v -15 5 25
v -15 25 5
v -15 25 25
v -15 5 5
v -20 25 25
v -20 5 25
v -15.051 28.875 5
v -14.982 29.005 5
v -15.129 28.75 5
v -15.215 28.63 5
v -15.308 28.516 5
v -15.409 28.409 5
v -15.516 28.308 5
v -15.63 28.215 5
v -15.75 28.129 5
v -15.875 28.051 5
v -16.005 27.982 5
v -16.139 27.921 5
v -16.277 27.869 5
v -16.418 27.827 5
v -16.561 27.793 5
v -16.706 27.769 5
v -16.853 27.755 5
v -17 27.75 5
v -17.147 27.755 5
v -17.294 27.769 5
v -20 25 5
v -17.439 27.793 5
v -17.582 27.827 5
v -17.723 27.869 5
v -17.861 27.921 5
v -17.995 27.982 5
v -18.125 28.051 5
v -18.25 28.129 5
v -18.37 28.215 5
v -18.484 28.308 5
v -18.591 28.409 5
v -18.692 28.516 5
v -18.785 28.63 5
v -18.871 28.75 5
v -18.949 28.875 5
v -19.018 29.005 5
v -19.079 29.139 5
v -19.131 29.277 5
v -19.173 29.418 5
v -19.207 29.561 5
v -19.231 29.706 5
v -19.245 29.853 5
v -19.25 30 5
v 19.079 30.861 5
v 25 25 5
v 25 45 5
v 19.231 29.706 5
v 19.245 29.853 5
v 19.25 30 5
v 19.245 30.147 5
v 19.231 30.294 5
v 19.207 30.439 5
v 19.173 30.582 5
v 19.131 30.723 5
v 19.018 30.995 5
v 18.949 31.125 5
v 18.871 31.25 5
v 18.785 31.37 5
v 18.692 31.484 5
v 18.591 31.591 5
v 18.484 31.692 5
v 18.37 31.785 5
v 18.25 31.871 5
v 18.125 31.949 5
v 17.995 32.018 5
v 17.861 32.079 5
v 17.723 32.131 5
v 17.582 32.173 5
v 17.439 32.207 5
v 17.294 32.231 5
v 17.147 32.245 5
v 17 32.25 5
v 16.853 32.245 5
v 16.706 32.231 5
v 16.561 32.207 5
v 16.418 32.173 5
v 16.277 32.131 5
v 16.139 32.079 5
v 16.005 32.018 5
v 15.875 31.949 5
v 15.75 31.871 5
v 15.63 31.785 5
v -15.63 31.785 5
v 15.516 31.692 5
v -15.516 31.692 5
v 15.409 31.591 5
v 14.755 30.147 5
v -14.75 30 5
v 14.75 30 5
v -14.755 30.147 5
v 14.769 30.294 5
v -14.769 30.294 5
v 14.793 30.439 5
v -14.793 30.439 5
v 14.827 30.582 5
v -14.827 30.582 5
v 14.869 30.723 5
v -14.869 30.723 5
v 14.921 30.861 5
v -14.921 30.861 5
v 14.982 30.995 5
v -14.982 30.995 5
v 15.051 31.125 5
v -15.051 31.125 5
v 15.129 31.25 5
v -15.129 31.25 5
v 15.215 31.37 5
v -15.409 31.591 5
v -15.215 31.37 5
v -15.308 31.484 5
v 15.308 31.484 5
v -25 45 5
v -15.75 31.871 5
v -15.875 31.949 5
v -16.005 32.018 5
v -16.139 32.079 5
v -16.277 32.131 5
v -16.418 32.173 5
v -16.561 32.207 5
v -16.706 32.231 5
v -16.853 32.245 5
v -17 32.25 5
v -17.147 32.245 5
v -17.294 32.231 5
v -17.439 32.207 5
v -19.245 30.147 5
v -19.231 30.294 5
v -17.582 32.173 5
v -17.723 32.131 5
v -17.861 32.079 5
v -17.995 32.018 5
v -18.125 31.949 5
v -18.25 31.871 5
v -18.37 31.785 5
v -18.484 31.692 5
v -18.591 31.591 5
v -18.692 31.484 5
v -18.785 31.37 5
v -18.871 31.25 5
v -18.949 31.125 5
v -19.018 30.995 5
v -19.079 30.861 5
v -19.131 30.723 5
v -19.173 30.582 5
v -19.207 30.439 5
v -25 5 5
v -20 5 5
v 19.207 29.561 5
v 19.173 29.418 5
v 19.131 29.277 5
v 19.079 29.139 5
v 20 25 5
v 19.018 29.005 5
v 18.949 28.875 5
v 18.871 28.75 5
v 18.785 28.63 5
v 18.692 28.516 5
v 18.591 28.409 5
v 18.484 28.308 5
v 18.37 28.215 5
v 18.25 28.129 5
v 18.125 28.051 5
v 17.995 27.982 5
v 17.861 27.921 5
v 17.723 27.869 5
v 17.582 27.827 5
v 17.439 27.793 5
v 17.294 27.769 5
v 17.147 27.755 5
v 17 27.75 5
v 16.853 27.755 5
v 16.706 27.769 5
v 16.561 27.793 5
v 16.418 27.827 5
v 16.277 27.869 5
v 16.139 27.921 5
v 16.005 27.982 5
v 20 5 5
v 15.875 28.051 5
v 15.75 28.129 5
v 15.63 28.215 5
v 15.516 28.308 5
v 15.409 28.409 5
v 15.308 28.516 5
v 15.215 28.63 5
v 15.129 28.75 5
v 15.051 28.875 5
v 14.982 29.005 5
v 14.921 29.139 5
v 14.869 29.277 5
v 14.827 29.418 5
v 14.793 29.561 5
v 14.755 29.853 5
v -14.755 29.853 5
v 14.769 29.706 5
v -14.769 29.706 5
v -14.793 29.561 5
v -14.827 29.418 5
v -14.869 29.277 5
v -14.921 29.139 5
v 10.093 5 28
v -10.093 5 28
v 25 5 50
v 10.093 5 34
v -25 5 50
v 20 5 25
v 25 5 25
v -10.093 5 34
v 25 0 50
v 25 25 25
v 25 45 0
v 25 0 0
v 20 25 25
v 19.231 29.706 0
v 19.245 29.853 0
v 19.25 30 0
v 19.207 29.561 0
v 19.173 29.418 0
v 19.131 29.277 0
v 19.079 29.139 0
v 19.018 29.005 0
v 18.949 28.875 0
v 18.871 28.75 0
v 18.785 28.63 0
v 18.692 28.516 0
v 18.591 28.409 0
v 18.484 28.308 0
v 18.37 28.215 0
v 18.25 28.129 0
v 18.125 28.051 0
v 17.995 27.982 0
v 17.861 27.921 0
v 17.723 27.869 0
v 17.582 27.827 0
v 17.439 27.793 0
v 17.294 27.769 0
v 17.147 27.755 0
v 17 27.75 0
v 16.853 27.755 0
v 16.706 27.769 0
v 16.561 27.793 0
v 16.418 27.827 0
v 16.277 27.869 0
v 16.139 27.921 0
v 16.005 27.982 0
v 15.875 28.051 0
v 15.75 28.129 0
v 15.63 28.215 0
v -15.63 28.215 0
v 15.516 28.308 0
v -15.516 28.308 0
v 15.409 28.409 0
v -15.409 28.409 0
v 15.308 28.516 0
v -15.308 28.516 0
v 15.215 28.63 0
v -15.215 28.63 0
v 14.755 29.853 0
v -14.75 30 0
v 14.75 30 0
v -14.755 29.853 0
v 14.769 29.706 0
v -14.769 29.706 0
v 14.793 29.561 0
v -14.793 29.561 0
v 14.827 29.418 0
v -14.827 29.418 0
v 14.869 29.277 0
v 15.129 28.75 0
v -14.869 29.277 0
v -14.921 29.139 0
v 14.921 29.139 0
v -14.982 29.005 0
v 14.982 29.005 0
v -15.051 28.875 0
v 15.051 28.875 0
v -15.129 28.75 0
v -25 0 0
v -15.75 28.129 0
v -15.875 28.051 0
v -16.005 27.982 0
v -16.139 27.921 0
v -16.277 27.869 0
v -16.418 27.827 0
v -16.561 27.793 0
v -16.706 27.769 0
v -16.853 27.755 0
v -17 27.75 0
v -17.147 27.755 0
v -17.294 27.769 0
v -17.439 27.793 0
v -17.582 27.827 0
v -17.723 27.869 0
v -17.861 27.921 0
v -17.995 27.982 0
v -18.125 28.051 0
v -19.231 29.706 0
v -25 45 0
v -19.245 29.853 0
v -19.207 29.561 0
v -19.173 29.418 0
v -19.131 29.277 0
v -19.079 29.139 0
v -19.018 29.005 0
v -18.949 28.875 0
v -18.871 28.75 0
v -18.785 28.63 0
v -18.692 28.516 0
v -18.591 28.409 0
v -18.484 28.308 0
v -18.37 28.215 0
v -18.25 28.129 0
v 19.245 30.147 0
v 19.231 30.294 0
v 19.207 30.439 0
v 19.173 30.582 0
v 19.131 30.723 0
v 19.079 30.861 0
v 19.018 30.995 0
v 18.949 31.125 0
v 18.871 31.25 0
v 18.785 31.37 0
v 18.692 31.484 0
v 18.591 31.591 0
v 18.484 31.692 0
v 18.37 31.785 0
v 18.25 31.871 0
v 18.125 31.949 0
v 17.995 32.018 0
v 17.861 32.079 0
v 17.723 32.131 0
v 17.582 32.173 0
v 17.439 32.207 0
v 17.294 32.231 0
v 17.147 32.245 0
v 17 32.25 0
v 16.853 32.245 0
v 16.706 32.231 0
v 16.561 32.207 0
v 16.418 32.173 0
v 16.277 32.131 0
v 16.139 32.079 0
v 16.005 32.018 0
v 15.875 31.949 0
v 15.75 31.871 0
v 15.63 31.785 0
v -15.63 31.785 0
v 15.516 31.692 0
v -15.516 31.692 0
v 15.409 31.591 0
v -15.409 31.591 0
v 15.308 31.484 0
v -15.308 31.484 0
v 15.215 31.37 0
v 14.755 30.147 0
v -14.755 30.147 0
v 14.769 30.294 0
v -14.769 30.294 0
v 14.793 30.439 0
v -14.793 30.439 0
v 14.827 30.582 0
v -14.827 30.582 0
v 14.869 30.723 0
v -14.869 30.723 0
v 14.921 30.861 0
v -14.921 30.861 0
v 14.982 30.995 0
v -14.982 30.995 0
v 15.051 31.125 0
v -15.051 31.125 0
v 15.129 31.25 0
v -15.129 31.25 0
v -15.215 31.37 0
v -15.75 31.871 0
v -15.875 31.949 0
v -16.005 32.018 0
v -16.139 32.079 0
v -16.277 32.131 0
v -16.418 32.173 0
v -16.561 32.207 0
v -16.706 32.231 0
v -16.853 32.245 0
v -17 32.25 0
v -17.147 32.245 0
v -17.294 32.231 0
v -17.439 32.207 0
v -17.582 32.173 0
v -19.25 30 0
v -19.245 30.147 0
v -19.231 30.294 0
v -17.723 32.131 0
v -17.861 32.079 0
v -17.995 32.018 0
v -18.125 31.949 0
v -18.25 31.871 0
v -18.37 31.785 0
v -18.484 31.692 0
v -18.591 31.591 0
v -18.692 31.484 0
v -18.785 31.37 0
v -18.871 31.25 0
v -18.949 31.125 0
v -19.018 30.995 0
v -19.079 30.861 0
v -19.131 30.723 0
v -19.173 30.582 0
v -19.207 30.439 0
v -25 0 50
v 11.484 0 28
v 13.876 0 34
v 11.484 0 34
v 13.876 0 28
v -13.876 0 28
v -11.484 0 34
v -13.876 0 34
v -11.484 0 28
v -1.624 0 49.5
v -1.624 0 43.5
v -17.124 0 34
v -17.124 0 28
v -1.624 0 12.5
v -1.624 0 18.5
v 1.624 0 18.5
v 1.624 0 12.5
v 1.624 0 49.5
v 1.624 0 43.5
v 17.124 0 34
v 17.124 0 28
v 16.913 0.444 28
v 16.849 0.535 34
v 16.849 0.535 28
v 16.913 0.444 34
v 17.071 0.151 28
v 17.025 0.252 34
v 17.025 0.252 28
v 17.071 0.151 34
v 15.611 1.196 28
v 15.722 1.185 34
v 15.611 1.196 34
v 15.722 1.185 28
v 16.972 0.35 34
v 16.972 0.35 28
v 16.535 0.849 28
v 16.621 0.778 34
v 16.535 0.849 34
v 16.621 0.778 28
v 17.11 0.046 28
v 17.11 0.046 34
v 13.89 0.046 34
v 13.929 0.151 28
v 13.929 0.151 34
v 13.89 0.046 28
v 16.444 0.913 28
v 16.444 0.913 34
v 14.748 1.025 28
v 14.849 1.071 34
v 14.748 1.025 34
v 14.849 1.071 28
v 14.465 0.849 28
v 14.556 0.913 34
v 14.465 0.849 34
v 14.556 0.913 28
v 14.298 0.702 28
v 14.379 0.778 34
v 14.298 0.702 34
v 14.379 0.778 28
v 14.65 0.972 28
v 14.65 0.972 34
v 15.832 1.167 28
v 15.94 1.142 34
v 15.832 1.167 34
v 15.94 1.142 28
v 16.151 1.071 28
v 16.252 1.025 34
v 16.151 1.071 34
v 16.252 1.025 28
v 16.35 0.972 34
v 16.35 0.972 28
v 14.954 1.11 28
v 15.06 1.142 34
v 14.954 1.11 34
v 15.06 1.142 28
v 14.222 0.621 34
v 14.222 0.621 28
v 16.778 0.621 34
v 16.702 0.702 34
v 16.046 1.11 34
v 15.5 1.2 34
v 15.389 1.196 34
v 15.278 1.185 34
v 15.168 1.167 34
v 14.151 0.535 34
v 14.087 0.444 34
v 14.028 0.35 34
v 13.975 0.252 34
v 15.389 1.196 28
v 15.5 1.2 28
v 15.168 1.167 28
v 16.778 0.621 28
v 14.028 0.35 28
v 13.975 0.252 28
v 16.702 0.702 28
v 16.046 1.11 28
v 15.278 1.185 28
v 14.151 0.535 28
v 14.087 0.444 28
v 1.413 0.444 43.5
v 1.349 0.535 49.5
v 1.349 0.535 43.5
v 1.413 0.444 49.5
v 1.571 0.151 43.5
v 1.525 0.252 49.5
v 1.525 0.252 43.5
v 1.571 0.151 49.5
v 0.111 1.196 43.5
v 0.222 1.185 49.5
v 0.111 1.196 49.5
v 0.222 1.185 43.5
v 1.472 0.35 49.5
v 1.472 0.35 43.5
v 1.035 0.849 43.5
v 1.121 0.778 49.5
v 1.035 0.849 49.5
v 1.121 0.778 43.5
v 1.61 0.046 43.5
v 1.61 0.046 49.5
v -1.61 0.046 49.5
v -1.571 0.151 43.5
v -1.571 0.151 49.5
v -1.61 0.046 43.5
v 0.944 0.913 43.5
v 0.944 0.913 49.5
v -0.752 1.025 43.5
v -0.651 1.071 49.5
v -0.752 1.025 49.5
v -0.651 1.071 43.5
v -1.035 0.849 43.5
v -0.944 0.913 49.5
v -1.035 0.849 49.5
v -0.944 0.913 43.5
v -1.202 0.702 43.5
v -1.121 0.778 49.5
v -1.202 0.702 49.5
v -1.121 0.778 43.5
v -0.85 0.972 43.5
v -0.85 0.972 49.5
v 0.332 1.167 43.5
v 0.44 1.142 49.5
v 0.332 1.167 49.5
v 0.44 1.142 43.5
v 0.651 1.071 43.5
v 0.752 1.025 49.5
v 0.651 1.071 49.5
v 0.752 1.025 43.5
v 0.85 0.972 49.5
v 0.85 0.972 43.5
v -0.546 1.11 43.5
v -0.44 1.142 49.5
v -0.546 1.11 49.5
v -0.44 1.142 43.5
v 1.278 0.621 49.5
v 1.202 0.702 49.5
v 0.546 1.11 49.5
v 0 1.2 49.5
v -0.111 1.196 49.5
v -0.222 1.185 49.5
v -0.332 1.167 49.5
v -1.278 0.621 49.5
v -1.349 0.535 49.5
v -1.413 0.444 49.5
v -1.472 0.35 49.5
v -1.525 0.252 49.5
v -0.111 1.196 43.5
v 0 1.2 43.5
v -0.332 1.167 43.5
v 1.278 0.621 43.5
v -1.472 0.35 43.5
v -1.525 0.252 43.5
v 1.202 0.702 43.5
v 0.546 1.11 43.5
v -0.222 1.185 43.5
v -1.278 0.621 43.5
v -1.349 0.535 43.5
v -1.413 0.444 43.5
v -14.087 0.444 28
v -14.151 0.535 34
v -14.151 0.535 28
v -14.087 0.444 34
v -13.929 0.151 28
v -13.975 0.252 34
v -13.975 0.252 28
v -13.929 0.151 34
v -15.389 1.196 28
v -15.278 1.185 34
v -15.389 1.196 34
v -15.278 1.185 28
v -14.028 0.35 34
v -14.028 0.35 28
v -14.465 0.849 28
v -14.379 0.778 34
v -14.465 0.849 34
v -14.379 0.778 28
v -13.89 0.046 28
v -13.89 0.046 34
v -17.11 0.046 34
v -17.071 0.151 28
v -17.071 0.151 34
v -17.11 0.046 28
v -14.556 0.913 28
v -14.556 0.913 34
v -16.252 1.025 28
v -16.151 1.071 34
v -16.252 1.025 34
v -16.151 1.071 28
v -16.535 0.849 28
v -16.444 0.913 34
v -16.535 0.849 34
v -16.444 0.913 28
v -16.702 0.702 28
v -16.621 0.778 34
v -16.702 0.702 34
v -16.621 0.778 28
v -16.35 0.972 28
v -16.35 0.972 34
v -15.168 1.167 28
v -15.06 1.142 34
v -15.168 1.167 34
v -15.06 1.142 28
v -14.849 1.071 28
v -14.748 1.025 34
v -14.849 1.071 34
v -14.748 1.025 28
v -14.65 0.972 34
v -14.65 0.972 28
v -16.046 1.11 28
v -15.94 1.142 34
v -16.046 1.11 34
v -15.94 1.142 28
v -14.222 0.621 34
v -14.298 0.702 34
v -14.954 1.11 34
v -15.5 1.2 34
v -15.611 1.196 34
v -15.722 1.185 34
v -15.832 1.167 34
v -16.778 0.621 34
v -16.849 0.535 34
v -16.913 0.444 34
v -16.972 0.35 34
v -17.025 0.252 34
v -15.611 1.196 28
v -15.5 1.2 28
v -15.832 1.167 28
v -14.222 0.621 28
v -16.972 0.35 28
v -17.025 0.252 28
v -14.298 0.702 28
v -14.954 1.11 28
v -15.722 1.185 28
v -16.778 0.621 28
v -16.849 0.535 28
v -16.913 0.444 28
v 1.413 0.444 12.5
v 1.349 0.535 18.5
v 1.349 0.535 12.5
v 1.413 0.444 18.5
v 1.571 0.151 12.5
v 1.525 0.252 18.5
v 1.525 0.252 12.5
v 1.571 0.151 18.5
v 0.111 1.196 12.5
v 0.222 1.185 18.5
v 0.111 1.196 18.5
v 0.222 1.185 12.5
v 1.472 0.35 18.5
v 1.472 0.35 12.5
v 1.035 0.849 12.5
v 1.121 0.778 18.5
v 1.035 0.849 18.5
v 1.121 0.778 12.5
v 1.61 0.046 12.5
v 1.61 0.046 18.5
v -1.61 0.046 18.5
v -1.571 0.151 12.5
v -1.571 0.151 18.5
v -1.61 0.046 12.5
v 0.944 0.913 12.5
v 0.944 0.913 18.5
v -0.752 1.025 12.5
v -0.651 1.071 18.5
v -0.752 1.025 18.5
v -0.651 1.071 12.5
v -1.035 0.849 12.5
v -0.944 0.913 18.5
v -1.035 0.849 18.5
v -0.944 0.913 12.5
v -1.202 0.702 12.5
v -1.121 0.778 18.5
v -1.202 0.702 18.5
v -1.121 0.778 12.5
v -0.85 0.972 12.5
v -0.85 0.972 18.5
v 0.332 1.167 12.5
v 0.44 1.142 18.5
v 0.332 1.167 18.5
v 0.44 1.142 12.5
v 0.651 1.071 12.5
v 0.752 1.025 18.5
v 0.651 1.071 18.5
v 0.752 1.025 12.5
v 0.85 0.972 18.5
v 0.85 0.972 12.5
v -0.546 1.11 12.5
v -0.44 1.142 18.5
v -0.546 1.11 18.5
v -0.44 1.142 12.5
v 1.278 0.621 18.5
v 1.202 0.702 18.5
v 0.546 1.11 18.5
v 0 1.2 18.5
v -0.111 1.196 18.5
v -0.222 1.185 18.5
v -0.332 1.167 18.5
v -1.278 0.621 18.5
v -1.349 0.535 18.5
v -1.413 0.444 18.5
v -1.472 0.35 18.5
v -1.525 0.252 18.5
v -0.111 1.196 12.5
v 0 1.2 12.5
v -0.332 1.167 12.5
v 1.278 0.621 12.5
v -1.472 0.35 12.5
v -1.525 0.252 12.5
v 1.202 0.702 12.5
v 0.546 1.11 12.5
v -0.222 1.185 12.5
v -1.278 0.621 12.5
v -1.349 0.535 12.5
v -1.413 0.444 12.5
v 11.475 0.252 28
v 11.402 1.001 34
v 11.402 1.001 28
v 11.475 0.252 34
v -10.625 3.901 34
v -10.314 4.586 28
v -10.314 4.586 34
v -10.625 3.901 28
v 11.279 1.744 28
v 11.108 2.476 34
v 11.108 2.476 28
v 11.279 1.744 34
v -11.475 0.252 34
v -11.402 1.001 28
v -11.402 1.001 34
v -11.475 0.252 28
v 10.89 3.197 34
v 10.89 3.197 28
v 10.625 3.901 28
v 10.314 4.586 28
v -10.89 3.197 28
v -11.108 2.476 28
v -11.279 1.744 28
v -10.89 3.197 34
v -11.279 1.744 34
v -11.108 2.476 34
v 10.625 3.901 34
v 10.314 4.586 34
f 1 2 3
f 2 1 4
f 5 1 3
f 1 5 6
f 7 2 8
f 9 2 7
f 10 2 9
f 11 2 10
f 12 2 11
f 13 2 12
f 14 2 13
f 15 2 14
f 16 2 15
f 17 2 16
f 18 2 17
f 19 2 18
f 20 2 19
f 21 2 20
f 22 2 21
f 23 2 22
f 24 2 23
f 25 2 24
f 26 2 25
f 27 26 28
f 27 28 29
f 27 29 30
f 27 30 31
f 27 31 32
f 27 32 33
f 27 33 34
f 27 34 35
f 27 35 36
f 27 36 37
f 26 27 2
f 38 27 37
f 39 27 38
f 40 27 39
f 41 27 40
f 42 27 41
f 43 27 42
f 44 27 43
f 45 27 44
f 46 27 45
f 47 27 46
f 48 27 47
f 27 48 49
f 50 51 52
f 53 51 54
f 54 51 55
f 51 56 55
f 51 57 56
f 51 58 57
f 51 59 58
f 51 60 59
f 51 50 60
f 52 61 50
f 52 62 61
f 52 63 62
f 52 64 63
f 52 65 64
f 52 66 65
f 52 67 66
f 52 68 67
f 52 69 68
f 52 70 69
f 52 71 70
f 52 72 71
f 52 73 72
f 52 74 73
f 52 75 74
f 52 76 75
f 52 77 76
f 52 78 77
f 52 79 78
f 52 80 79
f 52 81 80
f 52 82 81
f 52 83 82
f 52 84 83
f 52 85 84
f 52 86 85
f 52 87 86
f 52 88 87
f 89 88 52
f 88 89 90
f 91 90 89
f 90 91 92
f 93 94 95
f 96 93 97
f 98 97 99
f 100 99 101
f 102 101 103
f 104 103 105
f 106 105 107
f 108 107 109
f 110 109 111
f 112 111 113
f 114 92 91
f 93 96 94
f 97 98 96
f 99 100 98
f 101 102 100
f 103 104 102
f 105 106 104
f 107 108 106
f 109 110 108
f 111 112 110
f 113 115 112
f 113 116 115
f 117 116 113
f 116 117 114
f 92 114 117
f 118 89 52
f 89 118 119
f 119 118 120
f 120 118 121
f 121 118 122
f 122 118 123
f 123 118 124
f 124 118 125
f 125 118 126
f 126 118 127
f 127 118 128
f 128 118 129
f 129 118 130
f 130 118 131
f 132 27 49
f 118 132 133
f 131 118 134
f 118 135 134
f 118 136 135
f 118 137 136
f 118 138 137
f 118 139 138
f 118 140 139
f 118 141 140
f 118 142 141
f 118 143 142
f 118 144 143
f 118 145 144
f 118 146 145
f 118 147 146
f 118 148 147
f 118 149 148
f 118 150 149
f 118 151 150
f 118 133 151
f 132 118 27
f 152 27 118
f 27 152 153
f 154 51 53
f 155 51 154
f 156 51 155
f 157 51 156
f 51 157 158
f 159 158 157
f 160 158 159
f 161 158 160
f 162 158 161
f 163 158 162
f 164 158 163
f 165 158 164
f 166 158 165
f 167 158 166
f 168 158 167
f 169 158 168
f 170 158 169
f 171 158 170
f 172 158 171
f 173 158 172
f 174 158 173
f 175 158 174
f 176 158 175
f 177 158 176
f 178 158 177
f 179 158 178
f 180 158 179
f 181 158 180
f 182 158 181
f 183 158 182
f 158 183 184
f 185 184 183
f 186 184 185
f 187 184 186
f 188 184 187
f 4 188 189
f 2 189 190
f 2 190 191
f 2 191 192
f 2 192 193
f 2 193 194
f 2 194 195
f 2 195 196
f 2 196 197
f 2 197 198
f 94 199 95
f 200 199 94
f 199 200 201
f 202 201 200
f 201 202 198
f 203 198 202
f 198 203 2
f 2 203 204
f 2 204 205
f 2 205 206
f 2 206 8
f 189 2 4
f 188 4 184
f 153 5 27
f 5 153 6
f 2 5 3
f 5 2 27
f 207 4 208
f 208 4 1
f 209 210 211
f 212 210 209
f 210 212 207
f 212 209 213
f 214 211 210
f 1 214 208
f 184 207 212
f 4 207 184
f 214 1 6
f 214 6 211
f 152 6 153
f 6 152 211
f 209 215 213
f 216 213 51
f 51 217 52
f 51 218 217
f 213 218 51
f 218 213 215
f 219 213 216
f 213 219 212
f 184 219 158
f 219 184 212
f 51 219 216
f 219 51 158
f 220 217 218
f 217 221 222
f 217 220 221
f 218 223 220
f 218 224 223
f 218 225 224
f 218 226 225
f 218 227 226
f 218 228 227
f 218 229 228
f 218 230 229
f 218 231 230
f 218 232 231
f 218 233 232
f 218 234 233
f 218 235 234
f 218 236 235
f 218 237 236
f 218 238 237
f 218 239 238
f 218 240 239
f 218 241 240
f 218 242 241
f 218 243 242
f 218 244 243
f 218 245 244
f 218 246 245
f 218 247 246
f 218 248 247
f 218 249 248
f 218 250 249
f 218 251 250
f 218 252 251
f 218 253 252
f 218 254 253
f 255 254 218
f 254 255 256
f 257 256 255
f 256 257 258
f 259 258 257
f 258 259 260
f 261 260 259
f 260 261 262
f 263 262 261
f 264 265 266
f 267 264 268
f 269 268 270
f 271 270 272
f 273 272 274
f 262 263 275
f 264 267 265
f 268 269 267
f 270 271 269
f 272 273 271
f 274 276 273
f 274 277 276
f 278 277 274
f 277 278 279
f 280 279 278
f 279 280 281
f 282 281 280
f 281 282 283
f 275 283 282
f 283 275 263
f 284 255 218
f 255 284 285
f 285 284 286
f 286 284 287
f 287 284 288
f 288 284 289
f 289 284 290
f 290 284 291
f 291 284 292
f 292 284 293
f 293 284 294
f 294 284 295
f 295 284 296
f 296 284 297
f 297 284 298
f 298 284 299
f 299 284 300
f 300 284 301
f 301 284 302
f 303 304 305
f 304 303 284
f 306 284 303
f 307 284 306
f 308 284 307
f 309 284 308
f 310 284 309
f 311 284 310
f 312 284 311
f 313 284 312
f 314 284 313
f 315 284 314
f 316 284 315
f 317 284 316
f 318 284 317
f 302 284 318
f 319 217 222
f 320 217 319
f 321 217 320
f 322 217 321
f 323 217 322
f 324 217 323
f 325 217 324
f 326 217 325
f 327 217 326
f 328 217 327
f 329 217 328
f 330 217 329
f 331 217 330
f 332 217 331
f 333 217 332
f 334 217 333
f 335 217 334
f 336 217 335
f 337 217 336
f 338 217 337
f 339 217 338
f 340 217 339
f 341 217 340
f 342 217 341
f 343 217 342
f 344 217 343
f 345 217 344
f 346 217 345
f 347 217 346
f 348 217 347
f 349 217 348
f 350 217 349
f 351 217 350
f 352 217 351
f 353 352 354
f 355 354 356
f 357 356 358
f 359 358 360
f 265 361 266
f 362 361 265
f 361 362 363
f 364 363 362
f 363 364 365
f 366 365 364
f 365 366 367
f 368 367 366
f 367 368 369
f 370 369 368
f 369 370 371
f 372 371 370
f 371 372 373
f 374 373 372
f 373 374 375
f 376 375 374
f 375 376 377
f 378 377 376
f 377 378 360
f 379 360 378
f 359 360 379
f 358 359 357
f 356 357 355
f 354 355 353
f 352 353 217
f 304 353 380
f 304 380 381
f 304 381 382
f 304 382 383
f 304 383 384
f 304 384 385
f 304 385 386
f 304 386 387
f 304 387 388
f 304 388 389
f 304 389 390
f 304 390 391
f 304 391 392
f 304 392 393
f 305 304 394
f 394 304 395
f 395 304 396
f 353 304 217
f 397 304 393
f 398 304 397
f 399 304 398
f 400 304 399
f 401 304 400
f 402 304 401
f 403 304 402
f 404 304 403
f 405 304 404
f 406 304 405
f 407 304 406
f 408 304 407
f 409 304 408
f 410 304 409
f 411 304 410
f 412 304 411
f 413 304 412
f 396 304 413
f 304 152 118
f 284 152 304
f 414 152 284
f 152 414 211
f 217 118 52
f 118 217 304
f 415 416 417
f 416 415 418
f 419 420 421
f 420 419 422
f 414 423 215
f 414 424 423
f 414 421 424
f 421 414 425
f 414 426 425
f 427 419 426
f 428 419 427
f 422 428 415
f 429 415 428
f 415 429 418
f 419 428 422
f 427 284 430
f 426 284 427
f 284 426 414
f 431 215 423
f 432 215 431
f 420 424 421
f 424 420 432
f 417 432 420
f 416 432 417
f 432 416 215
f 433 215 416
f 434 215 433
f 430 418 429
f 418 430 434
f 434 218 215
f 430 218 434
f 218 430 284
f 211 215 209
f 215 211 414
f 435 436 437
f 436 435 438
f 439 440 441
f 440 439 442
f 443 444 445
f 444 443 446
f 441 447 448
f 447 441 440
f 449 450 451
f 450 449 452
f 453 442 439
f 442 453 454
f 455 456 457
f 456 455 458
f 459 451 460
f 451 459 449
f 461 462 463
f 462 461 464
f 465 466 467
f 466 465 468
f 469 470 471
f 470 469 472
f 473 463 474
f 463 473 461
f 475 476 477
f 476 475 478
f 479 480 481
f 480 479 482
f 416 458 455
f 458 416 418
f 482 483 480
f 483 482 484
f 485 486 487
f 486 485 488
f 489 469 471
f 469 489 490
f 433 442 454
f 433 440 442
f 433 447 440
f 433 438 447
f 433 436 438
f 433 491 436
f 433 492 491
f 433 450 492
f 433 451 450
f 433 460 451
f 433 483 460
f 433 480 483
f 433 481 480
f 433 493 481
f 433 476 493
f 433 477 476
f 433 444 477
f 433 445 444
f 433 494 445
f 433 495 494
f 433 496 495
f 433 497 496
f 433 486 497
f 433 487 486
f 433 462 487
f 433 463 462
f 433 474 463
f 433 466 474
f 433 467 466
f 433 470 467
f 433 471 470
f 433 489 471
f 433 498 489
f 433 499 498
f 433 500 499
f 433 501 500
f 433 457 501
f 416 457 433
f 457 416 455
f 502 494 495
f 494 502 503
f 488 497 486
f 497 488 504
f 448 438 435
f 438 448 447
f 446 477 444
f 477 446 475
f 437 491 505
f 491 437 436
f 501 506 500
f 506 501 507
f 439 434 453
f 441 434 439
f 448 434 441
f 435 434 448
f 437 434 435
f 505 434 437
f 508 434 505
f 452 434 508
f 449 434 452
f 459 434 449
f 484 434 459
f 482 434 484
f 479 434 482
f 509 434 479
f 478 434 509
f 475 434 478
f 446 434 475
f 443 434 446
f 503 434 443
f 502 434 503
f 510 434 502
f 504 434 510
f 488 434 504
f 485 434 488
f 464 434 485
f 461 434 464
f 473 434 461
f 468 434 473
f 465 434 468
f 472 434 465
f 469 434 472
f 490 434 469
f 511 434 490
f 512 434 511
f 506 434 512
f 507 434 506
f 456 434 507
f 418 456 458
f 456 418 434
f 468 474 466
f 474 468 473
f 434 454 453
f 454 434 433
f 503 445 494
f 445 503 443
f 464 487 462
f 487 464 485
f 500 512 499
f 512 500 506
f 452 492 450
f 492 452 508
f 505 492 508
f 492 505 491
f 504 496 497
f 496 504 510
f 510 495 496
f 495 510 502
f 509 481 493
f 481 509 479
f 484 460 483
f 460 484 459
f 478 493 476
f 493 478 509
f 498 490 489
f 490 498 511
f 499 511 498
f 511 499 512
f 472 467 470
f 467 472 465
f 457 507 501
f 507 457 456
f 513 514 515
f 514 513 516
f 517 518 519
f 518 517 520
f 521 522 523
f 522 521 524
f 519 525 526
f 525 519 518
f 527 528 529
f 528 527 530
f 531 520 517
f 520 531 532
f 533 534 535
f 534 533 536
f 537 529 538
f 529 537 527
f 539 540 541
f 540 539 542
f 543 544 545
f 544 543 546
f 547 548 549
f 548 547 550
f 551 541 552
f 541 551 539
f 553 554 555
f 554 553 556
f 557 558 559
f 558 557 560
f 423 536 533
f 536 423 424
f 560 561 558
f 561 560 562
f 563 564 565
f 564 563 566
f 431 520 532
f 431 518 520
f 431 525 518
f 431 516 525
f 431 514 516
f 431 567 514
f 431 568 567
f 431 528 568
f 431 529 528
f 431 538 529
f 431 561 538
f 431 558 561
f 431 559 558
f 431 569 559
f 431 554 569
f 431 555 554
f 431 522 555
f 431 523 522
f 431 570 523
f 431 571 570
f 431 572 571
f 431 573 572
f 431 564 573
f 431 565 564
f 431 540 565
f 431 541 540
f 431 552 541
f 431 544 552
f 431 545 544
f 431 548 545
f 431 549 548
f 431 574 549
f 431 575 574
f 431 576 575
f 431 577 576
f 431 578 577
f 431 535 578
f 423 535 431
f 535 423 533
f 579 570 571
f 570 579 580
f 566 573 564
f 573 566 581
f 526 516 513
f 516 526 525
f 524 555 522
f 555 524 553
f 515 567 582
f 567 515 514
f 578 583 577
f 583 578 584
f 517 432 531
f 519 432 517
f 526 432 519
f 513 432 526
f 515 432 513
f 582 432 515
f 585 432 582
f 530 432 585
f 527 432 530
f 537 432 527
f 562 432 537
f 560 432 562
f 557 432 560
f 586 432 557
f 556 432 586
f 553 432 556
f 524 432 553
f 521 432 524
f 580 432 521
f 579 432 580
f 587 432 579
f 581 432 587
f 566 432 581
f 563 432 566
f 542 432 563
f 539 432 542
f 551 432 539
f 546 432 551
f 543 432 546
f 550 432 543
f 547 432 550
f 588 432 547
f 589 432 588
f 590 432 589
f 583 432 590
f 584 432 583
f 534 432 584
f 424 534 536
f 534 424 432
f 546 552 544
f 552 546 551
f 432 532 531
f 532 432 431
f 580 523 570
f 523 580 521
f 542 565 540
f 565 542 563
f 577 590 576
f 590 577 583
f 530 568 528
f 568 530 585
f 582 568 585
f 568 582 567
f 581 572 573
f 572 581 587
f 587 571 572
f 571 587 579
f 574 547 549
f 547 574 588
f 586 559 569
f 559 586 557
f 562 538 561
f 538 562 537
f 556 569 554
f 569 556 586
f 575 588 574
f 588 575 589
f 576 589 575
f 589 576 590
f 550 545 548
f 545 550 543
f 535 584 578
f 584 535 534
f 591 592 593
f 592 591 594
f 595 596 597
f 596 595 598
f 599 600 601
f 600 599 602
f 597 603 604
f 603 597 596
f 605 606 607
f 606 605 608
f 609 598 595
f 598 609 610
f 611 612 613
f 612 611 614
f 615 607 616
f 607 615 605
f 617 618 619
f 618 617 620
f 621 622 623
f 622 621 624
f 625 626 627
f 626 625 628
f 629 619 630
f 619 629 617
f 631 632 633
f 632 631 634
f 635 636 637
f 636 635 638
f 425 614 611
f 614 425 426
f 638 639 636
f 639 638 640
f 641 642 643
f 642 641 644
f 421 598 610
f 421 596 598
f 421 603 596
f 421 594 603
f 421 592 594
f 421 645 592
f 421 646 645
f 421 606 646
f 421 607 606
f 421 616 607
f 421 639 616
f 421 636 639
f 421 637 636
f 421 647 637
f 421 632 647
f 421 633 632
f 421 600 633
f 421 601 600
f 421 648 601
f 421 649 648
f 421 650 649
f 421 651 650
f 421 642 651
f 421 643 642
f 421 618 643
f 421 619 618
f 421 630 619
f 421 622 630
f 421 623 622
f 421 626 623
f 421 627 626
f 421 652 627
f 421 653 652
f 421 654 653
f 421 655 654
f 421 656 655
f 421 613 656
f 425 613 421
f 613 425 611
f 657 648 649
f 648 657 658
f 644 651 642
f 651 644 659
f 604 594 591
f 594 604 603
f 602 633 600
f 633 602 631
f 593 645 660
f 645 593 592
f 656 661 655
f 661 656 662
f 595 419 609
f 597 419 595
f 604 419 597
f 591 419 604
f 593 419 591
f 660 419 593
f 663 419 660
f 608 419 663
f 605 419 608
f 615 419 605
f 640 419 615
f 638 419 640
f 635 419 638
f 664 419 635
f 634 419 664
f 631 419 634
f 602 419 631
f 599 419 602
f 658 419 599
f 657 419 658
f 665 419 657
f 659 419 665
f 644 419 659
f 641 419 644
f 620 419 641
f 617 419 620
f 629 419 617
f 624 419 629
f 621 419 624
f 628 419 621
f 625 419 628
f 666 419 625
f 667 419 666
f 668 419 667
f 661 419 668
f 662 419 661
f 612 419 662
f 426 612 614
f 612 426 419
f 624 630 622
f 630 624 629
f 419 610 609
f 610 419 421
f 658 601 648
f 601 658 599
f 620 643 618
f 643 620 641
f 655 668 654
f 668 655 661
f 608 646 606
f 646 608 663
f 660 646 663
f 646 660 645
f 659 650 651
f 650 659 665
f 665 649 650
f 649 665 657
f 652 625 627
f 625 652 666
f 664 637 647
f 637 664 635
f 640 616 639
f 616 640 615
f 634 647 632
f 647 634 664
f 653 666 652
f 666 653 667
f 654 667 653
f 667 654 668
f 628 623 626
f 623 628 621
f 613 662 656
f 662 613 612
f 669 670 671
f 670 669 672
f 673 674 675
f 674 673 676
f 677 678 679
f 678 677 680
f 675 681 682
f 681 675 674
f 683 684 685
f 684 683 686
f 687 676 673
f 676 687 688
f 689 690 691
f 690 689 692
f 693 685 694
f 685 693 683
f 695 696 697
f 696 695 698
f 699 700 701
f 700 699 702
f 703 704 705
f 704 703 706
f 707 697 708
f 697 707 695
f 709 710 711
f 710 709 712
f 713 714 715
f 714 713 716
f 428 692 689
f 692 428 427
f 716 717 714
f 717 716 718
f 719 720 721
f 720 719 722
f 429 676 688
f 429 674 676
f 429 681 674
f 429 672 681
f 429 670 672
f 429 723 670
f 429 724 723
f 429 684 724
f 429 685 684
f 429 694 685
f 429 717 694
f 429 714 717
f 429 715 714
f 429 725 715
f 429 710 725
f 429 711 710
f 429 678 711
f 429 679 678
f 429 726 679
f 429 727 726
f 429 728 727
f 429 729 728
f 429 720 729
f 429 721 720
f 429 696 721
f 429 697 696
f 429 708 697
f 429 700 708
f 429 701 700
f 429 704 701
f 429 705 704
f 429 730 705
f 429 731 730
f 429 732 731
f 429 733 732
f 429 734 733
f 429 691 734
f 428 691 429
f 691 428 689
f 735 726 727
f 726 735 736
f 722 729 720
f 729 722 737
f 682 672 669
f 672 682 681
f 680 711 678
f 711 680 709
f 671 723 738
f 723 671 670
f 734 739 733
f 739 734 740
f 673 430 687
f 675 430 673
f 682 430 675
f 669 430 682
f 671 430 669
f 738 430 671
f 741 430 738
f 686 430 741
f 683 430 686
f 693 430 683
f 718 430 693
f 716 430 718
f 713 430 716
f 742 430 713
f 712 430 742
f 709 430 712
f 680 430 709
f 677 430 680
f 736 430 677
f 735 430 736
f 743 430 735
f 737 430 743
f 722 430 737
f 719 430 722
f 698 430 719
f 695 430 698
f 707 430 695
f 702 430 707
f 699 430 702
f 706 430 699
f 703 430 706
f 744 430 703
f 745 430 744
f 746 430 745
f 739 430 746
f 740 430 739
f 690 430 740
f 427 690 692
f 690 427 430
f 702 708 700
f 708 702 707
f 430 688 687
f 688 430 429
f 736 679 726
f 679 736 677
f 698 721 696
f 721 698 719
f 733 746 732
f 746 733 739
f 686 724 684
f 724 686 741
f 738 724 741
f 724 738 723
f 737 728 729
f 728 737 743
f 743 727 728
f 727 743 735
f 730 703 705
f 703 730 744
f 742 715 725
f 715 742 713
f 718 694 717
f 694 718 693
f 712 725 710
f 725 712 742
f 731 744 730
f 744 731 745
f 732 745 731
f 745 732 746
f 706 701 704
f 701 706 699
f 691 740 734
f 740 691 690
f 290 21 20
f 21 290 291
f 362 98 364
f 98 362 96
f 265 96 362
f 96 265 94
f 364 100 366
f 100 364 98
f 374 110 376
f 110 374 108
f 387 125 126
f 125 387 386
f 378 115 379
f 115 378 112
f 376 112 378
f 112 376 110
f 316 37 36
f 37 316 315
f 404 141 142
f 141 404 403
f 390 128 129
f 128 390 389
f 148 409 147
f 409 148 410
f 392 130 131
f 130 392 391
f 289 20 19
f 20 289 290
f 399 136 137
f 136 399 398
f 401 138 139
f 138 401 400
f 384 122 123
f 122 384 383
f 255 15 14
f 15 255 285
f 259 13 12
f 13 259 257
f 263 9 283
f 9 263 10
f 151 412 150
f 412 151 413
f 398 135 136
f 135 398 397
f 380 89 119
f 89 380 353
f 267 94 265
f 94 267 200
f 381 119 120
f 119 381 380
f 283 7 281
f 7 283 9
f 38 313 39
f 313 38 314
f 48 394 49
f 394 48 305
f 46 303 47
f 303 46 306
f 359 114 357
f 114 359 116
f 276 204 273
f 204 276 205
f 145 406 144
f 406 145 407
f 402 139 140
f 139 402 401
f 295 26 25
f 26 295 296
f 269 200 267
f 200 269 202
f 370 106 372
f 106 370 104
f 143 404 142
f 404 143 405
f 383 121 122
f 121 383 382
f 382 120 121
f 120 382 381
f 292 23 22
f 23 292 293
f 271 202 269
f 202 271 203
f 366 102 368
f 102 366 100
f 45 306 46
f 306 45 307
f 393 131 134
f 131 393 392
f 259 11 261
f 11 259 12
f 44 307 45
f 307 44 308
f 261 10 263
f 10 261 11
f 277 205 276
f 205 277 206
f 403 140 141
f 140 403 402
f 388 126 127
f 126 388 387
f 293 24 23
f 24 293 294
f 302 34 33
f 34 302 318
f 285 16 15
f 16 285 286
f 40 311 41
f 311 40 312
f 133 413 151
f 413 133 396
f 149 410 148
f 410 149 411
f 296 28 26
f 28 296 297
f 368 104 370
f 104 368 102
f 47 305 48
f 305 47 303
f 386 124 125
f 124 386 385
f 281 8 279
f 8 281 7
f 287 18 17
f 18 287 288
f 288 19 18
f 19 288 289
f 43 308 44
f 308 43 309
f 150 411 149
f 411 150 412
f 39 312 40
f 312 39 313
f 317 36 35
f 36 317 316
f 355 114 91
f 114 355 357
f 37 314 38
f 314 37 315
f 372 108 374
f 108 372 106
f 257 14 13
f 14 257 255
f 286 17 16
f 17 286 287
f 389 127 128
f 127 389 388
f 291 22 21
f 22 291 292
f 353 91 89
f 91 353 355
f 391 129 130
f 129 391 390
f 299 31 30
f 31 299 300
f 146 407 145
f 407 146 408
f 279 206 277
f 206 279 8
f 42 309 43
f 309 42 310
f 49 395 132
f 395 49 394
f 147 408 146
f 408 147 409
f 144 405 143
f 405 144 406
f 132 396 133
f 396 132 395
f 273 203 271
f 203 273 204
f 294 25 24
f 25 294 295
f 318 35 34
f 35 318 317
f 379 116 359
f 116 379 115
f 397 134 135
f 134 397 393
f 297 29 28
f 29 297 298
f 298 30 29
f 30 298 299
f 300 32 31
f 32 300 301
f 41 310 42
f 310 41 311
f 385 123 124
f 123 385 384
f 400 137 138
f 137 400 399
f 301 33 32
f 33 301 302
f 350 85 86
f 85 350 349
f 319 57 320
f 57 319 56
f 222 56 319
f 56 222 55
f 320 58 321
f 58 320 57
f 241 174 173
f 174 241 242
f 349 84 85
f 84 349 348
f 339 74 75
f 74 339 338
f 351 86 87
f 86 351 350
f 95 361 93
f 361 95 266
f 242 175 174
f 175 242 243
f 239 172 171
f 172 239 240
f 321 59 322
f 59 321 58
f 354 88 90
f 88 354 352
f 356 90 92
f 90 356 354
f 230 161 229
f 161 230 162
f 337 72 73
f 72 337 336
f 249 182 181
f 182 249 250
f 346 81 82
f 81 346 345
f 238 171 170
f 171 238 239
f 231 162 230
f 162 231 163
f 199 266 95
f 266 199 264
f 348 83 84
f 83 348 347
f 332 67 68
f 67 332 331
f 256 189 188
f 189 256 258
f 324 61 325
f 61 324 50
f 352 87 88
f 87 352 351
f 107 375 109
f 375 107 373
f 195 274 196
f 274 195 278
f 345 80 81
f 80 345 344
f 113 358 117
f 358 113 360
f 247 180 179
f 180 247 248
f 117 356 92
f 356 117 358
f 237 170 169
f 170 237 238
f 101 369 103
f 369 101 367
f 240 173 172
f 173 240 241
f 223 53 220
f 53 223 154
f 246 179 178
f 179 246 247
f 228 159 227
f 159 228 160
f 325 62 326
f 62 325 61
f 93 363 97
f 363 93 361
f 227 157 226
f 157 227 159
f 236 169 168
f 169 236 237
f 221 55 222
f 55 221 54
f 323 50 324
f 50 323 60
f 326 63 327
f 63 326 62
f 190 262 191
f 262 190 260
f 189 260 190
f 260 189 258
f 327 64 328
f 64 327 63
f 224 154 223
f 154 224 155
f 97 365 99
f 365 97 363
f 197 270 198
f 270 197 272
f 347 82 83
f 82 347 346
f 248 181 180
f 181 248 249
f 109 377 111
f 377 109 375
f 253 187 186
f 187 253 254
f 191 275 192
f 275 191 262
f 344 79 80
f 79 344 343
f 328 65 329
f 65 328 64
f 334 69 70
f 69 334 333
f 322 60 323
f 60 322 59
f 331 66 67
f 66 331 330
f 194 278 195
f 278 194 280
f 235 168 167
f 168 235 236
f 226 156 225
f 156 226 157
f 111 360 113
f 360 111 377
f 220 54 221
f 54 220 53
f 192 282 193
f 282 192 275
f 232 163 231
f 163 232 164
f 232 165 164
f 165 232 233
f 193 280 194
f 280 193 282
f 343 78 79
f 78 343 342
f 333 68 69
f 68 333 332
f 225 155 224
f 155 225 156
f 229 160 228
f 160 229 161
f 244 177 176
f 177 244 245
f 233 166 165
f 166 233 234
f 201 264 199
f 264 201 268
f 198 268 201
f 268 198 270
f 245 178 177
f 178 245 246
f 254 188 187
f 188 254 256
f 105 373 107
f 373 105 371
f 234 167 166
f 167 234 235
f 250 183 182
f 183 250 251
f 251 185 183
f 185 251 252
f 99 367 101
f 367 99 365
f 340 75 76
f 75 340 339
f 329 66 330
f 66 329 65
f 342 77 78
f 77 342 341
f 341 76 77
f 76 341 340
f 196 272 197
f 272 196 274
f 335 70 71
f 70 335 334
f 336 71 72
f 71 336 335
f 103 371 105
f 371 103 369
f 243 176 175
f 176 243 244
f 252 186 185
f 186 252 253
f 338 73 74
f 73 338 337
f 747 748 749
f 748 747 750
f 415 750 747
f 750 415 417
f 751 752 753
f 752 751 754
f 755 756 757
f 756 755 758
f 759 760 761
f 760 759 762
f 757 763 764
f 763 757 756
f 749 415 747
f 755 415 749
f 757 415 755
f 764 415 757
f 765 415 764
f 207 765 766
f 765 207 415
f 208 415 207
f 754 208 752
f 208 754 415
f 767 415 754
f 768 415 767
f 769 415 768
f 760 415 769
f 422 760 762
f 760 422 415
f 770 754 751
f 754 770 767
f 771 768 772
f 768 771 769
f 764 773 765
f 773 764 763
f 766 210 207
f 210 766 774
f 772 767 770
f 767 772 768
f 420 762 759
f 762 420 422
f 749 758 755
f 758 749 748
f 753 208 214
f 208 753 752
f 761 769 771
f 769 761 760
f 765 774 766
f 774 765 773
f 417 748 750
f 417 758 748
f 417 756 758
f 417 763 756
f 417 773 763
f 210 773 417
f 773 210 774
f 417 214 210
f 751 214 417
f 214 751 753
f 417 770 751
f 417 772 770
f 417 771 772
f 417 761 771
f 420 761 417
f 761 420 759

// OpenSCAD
// L-shaped mounting bracket for NEMA 17 stepper motor (e.g. syringe pump)
// Print orientation: base plate on bed, vertical plate builds upward (+Z)

// ---------------- Parameters ----------------
base_x      = 25;     // base plate half-length in X (plate spans -25 to 25)
base_y      = 45;     // base plate length in Y (0 to 45)
base_z      = 5;      // base plate thickness

motor_h     = 50;     // vertical motor plate height (z = 0 to 50)
motor_t     = 5;      // vertical motor plate thickness in Y (0 to 5)

boss_d      = 23;     // motor centring boss hole diameter
boss_x      = 0;      // boss hole centre X
boss_z      = 28;     // boss hole centre Z

screw_d     = 3.4;    // M3 screw hole diameter
screw_n     = 4;      // number of screw holes
screw_a     = 31;     // square pattern side length (hole centre to hole centre)

gusset_t    = 5;      // gusset thickness in X
gusset_y    = 20;     // gusset leg along +Y (from y = 5)
gusset_z    = 20;     // gusset leg along +Z (from z = 5)

eps         = 0.5;    // cutter overshoot past faces
$fn         = 96;     // curve resolution

// ---------------- Model ----------------
difference() {
    union() {
        // Base plate
        translate([-base_x, 0, 0])
            cube([2 * base_x, base_y, base_z]);

        // Vertical motor plate
        translate([-base_x, 0, 0])
            cube([2 * base_x, motor_t, motor_h]);

        // Gussets: right-angle corner at (y = 5, z = 5), flush with left/right edges
        for (sx = [-1, 1])
            translate([sx * (base_x - gusset_t), 5, 5])
                cube([gusset_t, gusset_y, gusset_z]);
    }

    // Base plate M4 through-holes
    translate([-17, 30, -eps])
        cylinder(d = 4.5, h = base_z + 2 * eps);
    translate([17, 30, -eps])
        cylinder(d = 4.5, h = base_z + 2 * eps);

    // Motor plate boss hole (along Y) and M3 screw holes on 31 mm square pattern
    translate([boss_x, -eps, boss_z])
        cylinder(d = boss_d, h = motor_t + 2 * eps);
    for (i = [0 : screw_n - 1]) {
        angle = i * 90;
        translate([boss_x + screw_a / 2 * cos(angle),
                   -eps, boss_z + screw_a / 2 * sin(angle)])
            cylinder(d = screw_d, h = motor_t + 2 * eps);
    }
}
